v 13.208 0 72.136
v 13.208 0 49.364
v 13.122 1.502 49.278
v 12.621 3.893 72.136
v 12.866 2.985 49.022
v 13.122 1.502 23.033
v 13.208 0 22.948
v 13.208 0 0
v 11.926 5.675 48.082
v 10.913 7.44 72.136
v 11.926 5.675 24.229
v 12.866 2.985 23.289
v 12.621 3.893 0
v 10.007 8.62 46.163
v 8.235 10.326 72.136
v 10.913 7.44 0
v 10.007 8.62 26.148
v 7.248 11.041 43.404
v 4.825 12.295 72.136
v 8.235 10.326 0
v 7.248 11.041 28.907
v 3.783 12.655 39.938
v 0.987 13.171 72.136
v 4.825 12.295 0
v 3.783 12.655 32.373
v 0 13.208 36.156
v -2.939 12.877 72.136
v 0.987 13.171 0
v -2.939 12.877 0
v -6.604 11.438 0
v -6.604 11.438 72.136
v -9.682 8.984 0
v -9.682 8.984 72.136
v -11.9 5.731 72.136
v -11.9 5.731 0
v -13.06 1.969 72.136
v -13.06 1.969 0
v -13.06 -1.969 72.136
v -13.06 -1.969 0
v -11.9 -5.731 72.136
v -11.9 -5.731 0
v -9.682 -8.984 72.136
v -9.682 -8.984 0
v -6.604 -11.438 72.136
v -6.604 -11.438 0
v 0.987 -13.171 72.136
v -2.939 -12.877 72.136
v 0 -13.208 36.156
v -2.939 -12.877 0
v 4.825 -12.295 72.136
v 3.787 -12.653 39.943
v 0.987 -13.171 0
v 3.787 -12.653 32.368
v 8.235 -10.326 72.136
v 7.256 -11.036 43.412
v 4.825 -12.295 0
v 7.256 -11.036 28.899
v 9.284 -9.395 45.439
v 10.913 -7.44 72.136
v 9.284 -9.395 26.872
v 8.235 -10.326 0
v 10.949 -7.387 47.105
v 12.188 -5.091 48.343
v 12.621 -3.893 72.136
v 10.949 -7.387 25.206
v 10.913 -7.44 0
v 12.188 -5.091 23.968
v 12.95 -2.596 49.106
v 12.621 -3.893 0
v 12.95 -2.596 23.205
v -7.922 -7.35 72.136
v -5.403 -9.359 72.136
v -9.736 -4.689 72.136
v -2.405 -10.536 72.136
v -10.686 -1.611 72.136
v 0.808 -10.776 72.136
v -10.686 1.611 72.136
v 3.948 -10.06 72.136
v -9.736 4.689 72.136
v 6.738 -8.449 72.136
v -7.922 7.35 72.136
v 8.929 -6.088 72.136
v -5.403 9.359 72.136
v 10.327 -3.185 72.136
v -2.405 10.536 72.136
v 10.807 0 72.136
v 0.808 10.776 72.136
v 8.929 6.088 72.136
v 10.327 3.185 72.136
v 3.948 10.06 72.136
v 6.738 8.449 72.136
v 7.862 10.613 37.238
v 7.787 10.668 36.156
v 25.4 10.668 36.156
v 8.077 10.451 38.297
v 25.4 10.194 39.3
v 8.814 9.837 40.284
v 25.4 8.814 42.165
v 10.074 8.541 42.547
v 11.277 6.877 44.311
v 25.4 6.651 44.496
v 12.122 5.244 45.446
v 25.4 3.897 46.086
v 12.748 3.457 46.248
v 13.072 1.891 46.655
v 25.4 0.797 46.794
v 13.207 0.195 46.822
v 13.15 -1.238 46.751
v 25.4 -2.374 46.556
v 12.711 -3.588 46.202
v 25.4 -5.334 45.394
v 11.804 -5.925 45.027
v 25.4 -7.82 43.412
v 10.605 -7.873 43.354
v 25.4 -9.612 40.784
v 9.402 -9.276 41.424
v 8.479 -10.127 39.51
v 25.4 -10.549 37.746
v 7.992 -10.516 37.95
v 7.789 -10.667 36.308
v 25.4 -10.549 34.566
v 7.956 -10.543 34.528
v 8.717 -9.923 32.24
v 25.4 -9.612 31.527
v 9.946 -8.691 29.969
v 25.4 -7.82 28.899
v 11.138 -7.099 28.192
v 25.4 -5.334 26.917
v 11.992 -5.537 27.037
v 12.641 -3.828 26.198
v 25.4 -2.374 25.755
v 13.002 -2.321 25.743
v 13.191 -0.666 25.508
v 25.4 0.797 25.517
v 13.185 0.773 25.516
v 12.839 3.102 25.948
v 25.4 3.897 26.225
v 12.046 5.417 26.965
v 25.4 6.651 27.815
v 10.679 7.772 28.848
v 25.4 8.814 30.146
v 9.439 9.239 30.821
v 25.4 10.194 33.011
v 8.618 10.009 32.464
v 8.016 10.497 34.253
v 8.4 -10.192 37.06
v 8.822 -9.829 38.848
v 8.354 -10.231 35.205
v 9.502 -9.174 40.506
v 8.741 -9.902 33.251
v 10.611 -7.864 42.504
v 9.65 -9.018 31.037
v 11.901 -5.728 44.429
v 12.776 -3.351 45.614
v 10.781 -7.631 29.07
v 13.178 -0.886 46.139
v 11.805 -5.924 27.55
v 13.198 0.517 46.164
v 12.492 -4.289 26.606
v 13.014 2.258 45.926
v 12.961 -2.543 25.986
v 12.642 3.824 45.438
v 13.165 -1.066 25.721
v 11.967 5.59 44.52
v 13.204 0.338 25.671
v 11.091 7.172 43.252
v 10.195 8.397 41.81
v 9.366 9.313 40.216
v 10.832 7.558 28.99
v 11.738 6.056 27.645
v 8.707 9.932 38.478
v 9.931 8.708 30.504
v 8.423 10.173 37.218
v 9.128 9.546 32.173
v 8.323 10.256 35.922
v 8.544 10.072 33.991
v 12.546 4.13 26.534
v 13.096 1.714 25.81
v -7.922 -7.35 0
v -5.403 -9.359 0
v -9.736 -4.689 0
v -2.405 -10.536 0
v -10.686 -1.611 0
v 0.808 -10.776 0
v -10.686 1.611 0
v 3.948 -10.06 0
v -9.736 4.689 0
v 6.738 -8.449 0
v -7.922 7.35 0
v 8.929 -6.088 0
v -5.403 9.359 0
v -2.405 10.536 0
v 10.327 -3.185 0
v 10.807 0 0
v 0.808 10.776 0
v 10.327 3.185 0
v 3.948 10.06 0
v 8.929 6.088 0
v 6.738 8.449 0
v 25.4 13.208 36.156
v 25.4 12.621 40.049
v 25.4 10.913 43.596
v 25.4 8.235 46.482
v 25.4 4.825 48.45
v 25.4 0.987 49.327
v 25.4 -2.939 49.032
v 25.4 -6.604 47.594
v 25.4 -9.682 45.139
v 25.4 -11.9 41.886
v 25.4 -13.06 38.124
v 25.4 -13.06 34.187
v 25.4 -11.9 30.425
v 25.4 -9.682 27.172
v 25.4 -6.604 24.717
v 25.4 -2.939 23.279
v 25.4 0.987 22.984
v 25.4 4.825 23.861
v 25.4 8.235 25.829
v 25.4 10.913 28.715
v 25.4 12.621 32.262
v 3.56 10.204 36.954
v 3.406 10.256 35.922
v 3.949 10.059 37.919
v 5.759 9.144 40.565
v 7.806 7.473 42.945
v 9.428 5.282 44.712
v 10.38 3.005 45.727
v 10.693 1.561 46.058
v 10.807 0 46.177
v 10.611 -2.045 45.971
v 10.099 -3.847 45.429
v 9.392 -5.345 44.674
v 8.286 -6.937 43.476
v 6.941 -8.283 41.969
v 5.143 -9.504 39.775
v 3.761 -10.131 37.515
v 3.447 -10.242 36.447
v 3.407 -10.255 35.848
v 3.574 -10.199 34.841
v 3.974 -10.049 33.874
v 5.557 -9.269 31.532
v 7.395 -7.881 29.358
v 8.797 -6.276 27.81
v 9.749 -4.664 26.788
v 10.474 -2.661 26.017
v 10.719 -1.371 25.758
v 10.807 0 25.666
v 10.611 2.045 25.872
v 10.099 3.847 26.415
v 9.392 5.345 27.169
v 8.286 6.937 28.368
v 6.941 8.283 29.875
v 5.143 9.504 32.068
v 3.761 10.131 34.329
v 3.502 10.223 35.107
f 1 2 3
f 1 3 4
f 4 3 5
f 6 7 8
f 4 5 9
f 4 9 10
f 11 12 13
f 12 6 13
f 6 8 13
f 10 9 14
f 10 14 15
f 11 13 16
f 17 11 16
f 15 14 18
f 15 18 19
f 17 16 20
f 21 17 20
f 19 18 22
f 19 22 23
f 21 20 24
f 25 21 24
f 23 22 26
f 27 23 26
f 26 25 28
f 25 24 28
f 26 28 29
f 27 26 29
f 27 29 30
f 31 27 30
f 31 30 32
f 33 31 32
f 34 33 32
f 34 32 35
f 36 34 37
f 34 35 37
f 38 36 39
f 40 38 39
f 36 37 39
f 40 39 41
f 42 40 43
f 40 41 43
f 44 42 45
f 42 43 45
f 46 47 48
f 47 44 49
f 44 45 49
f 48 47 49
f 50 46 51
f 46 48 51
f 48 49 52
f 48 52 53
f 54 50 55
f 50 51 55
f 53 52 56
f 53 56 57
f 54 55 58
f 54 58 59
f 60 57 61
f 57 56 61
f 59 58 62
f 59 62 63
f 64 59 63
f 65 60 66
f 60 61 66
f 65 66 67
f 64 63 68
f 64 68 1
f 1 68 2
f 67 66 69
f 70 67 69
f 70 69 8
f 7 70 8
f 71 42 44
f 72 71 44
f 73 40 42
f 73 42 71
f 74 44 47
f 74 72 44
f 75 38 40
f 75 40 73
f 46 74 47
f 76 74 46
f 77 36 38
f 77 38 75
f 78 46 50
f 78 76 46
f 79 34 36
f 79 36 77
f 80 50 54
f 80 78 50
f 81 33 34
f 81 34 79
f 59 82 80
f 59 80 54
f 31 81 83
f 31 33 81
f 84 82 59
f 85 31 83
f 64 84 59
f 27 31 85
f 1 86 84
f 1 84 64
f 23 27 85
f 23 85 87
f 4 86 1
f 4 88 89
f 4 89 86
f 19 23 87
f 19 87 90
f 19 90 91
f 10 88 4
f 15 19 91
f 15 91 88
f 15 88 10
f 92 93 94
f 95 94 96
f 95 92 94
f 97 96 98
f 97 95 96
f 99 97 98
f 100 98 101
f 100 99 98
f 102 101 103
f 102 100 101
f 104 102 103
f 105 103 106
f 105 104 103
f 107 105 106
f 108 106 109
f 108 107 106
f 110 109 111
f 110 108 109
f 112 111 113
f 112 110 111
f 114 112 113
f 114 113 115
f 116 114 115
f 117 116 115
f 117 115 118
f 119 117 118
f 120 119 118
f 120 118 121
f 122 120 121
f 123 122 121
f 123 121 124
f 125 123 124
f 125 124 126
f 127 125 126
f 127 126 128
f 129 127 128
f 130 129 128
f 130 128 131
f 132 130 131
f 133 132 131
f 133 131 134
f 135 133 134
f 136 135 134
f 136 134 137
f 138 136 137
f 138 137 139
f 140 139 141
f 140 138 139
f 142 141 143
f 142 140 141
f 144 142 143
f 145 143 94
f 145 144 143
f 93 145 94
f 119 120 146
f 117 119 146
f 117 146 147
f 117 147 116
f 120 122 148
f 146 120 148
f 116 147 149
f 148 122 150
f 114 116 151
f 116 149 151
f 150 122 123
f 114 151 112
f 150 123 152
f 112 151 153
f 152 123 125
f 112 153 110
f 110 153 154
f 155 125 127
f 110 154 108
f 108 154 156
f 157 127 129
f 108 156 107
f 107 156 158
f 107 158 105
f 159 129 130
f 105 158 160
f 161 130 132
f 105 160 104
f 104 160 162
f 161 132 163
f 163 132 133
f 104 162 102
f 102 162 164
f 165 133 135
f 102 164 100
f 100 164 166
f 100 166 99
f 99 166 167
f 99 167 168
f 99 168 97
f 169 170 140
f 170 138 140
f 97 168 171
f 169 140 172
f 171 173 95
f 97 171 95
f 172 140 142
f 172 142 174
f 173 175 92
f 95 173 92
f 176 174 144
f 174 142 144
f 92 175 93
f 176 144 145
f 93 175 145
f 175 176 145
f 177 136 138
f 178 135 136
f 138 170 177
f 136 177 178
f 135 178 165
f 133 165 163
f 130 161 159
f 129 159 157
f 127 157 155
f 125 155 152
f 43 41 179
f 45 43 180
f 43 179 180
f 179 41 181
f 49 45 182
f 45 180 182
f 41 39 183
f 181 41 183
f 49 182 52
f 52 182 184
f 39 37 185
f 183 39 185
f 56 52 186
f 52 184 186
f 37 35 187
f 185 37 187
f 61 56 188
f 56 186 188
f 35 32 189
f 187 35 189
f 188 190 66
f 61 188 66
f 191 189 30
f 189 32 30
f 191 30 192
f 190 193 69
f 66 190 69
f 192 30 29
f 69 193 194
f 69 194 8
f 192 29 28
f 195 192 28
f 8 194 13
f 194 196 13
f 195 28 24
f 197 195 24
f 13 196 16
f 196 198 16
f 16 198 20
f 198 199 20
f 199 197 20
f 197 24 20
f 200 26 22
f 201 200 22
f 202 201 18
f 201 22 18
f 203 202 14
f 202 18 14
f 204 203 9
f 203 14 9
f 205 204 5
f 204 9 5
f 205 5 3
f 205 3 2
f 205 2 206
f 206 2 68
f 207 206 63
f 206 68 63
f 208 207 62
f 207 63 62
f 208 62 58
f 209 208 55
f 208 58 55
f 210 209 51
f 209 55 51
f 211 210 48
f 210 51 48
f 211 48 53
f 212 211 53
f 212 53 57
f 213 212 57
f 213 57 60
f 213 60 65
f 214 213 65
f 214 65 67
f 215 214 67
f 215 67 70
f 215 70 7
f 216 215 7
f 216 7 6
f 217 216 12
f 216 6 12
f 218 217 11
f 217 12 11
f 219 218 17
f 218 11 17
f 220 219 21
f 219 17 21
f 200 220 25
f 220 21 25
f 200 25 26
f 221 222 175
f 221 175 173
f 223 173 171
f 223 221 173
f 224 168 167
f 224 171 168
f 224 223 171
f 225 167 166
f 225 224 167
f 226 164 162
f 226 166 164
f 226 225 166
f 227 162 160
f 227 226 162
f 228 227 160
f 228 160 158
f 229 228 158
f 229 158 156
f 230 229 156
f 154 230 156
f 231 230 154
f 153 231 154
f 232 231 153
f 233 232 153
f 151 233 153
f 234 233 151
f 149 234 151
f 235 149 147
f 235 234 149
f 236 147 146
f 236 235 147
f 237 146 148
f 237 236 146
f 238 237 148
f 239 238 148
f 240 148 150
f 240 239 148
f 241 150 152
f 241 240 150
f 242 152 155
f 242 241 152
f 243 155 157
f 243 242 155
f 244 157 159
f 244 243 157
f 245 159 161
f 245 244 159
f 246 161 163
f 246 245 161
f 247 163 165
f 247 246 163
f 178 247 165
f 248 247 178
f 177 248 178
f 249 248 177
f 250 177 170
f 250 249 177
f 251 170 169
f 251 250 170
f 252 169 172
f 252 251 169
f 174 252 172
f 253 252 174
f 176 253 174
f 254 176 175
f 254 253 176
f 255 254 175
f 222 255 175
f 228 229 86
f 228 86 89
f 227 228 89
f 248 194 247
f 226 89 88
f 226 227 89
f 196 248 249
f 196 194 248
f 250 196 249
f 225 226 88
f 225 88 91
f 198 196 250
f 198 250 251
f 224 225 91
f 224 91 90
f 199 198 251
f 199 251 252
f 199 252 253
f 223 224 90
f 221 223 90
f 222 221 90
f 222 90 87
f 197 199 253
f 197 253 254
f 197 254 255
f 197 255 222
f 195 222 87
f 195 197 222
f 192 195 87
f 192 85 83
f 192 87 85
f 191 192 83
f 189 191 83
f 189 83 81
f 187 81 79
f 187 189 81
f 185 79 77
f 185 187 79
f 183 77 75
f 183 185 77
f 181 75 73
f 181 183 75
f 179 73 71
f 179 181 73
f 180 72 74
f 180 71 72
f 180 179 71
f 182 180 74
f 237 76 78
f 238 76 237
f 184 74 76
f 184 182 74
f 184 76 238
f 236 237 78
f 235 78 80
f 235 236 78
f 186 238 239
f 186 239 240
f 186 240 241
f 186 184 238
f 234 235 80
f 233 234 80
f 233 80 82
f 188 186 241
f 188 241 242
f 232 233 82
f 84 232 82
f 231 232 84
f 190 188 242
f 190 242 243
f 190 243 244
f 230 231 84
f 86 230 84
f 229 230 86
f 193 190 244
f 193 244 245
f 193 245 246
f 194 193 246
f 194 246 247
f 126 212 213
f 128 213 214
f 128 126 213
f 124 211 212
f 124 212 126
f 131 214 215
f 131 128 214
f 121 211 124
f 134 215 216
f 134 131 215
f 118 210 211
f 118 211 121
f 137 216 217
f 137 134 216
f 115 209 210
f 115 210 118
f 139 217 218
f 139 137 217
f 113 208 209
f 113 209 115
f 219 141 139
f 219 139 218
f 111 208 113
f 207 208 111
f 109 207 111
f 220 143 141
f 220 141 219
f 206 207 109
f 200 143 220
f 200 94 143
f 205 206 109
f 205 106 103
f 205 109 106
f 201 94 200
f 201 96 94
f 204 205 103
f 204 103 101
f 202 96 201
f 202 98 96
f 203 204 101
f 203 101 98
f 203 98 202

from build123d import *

# Parameters (mm, degrees)
F0_R     = 13.208
F0_R_2   = 10.668
F1_DEPTH = 72.136
F2_R     = 13.208
F2_R_2   = 10.668
F3_DEPTH = 25.4
F4_R     = 10.255717
F5_DEPTH = 25.4
F6_R     = 10.806654
F7_DEPTH = 76.2


with BuildPart() as f1:
    # F0 (on Top) → F1 (new body)
    with BuildSketch(Plane.XY):
        Circle(F0_R)
        Circle(F0_R_2, mode=Mode.SUBTRACT)
    extrude(amount=F1_DEPTH)

    # F2 (on Right) → F3 (join)
    with BuildSketch(Plane.YZ):
        with Locations((0, 36.155518)):
            Circle(F2_R)
        with Locations((0, 36.155518)):
            Circle(F2_R_2, mode=Mode.SUBTRACT)
    extrude(amount=F3_DEPTH)

    # F4 (on Right) → F5 (cut)
    with BuildSketch(Plane.YZ):
        with Locations((0, 35.921648)):
            Circle(F4_R)
    extrude(amount=F5_DEPTH, mode=Mode.SUBTRACT)

    # F6 (on Top) → F7 (cut)
    with BuildSketch(Plane.XY):
        Circle(F6_R)
    extrude(amount=F7_DEPTH, mode=Mode.SUBTRACT)


solid = f1.part
